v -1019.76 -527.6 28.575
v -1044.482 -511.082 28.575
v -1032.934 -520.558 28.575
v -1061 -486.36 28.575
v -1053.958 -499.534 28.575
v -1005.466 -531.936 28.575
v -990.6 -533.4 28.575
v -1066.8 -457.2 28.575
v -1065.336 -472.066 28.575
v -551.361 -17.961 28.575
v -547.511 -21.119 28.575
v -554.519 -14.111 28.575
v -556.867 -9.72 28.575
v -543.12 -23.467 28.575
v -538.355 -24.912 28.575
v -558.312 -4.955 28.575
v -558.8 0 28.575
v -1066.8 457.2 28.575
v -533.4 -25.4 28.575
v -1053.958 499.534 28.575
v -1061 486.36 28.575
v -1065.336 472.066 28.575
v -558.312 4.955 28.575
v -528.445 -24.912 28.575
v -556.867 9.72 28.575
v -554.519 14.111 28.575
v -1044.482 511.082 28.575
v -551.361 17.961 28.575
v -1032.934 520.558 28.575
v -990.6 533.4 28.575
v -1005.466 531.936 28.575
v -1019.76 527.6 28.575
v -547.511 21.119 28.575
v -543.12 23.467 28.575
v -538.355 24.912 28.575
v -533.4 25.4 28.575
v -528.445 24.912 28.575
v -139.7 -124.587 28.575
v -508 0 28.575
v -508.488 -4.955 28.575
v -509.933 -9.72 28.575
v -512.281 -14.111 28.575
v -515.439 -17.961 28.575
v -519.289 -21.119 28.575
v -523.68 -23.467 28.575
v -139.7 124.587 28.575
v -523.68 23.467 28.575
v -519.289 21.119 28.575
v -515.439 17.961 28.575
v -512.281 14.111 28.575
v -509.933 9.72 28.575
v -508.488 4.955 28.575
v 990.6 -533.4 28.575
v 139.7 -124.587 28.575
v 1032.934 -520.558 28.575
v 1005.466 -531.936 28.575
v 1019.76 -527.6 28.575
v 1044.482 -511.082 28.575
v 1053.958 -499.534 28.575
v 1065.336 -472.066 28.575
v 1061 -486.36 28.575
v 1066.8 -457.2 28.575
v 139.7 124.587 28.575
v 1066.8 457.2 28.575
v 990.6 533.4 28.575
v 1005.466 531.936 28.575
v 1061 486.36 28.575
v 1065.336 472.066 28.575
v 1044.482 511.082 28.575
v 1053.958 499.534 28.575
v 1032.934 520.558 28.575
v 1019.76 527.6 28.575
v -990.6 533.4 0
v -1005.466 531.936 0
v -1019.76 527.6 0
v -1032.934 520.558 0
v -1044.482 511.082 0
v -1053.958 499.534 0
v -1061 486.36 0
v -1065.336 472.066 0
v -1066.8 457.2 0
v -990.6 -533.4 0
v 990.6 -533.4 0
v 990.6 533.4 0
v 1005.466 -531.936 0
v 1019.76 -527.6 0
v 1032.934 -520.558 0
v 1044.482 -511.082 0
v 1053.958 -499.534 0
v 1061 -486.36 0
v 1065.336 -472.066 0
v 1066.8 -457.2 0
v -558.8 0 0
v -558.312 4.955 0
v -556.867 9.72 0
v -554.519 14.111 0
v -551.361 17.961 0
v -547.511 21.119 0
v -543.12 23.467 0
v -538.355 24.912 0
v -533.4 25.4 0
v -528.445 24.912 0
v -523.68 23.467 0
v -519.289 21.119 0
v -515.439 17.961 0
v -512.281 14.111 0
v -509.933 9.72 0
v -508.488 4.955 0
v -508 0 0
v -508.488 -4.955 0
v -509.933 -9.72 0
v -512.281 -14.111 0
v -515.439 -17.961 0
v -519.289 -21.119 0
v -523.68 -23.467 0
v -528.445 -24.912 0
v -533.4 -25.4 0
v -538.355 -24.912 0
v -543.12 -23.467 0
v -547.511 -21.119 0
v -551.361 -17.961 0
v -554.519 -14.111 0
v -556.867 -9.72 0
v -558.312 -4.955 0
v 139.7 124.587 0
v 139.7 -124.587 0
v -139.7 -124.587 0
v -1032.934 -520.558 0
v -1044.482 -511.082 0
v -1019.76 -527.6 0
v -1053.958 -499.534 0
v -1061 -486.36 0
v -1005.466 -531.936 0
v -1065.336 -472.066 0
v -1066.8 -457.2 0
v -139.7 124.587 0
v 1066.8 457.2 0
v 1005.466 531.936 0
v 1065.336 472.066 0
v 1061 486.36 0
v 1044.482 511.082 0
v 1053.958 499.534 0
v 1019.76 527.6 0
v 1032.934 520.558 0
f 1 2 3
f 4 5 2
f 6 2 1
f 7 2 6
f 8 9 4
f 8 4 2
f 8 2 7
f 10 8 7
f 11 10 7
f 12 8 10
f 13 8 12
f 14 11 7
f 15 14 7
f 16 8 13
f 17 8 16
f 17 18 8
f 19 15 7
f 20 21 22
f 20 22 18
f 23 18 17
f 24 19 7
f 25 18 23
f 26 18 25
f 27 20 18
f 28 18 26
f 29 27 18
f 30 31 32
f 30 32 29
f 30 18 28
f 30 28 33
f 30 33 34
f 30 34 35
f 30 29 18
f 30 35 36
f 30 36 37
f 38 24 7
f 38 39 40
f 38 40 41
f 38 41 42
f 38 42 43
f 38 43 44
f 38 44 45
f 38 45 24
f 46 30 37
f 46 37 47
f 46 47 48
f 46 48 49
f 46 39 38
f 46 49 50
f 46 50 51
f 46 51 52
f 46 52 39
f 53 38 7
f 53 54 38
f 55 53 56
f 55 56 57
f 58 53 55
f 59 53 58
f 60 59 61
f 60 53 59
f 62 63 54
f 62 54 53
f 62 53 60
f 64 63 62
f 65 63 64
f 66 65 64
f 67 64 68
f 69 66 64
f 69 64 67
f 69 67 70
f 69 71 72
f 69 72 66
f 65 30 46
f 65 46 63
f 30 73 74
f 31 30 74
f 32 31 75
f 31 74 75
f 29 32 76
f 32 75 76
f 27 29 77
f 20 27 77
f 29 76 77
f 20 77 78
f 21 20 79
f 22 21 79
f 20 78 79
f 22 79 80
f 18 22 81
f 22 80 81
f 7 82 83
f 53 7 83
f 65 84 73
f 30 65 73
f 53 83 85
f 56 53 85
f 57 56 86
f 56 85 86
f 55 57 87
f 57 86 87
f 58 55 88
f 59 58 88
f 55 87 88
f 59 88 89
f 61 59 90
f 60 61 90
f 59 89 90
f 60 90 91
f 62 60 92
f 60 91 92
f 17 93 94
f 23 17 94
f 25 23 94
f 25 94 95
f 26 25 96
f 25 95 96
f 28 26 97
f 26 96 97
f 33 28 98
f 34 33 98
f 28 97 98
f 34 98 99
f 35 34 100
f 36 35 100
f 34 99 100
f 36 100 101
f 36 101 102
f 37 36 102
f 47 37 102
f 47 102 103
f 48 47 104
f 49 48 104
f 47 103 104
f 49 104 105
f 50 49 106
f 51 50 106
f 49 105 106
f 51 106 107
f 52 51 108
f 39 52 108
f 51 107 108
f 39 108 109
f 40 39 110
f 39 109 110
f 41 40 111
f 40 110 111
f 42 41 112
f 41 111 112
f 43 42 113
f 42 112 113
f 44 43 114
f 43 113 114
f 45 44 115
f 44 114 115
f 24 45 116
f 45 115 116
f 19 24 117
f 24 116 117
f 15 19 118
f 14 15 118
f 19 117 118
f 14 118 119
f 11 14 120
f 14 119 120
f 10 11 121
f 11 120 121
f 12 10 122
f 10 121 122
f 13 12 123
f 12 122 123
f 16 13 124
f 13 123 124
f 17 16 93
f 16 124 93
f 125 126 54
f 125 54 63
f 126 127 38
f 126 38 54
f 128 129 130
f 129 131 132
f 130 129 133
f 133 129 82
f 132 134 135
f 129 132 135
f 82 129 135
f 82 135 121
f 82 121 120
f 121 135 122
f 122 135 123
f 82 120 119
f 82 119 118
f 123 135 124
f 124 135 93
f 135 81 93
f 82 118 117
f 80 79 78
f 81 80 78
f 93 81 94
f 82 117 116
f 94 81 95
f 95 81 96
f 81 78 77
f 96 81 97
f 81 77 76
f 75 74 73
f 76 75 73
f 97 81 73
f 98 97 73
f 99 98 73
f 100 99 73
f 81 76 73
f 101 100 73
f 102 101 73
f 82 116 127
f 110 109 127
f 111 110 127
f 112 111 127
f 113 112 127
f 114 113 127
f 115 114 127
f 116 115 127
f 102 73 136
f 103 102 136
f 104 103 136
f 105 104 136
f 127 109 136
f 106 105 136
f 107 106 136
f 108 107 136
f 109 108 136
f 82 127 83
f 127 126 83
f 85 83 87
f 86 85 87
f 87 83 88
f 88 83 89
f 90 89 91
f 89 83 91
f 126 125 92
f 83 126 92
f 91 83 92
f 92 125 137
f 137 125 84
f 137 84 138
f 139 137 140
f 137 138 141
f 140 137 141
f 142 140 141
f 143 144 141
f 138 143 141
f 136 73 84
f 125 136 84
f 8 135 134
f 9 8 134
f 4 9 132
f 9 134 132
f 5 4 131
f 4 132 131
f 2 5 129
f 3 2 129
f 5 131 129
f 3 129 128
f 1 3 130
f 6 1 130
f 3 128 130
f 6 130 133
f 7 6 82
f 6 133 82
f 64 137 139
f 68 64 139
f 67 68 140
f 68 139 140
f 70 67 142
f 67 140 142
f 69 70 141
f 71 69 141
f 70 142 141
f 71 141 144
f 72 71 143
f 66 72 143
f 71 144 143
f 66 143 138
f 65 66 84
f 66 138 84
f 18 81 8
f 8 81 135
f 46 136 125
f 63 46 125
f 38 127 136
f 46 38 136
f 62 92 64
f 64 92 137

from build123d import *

# Parameters (mm, degrees)
F0_W     = 279.4
F0_H     = 249.174
F1_DEPTH = 28.575


with BuildPart() as f1:
    # F0 (on Top) → F1 (new body)
    with BuildSketch(Plane.XY):
        with BuildLine():
            Line((990.6, 533.4), (-990.6, 533.4))
            ThreePointArc((-990.6, 533.4), (-1044.481537, 511.081537), (-1066.8, 457.2))
            Line((-1066.8, 457.2), (-1066.8, 0))
            Line((-1066.8, 0), (-1066.8, -457.2))
            ThreePointArc((-1066.8, -457.2), (-1044.481537, -511.081537), (-990.6, -533.4))
            Line((-990.6, -533.4), (990.6, -533.4))
            ThreePointArc((990.6, -533.4), (1044.481537, -511.081537), (1066.8, -457.2))
            Line((1066.8, -457.2), (1066.8, 457.2))
            ThreePointArc((1066.8, 457.2), (1044.481537, 511.081537), (990.6, 533.4))
        make_face()
        with BuildLine():
            ThreePointArc((-508, 0), (-533.4, -25.4), (-558.8, 0))
            ThreePointArc((-558.8, 0), (-533.4, 25.4), (-508, 0))
        make_face(mode=Mode.SUBTRACT)
        Rectangle(F0_W, F0_H, mode=Mode.SUBTRACT)
    extrude(amount=F1_DEPTH)


solid = f1.part
